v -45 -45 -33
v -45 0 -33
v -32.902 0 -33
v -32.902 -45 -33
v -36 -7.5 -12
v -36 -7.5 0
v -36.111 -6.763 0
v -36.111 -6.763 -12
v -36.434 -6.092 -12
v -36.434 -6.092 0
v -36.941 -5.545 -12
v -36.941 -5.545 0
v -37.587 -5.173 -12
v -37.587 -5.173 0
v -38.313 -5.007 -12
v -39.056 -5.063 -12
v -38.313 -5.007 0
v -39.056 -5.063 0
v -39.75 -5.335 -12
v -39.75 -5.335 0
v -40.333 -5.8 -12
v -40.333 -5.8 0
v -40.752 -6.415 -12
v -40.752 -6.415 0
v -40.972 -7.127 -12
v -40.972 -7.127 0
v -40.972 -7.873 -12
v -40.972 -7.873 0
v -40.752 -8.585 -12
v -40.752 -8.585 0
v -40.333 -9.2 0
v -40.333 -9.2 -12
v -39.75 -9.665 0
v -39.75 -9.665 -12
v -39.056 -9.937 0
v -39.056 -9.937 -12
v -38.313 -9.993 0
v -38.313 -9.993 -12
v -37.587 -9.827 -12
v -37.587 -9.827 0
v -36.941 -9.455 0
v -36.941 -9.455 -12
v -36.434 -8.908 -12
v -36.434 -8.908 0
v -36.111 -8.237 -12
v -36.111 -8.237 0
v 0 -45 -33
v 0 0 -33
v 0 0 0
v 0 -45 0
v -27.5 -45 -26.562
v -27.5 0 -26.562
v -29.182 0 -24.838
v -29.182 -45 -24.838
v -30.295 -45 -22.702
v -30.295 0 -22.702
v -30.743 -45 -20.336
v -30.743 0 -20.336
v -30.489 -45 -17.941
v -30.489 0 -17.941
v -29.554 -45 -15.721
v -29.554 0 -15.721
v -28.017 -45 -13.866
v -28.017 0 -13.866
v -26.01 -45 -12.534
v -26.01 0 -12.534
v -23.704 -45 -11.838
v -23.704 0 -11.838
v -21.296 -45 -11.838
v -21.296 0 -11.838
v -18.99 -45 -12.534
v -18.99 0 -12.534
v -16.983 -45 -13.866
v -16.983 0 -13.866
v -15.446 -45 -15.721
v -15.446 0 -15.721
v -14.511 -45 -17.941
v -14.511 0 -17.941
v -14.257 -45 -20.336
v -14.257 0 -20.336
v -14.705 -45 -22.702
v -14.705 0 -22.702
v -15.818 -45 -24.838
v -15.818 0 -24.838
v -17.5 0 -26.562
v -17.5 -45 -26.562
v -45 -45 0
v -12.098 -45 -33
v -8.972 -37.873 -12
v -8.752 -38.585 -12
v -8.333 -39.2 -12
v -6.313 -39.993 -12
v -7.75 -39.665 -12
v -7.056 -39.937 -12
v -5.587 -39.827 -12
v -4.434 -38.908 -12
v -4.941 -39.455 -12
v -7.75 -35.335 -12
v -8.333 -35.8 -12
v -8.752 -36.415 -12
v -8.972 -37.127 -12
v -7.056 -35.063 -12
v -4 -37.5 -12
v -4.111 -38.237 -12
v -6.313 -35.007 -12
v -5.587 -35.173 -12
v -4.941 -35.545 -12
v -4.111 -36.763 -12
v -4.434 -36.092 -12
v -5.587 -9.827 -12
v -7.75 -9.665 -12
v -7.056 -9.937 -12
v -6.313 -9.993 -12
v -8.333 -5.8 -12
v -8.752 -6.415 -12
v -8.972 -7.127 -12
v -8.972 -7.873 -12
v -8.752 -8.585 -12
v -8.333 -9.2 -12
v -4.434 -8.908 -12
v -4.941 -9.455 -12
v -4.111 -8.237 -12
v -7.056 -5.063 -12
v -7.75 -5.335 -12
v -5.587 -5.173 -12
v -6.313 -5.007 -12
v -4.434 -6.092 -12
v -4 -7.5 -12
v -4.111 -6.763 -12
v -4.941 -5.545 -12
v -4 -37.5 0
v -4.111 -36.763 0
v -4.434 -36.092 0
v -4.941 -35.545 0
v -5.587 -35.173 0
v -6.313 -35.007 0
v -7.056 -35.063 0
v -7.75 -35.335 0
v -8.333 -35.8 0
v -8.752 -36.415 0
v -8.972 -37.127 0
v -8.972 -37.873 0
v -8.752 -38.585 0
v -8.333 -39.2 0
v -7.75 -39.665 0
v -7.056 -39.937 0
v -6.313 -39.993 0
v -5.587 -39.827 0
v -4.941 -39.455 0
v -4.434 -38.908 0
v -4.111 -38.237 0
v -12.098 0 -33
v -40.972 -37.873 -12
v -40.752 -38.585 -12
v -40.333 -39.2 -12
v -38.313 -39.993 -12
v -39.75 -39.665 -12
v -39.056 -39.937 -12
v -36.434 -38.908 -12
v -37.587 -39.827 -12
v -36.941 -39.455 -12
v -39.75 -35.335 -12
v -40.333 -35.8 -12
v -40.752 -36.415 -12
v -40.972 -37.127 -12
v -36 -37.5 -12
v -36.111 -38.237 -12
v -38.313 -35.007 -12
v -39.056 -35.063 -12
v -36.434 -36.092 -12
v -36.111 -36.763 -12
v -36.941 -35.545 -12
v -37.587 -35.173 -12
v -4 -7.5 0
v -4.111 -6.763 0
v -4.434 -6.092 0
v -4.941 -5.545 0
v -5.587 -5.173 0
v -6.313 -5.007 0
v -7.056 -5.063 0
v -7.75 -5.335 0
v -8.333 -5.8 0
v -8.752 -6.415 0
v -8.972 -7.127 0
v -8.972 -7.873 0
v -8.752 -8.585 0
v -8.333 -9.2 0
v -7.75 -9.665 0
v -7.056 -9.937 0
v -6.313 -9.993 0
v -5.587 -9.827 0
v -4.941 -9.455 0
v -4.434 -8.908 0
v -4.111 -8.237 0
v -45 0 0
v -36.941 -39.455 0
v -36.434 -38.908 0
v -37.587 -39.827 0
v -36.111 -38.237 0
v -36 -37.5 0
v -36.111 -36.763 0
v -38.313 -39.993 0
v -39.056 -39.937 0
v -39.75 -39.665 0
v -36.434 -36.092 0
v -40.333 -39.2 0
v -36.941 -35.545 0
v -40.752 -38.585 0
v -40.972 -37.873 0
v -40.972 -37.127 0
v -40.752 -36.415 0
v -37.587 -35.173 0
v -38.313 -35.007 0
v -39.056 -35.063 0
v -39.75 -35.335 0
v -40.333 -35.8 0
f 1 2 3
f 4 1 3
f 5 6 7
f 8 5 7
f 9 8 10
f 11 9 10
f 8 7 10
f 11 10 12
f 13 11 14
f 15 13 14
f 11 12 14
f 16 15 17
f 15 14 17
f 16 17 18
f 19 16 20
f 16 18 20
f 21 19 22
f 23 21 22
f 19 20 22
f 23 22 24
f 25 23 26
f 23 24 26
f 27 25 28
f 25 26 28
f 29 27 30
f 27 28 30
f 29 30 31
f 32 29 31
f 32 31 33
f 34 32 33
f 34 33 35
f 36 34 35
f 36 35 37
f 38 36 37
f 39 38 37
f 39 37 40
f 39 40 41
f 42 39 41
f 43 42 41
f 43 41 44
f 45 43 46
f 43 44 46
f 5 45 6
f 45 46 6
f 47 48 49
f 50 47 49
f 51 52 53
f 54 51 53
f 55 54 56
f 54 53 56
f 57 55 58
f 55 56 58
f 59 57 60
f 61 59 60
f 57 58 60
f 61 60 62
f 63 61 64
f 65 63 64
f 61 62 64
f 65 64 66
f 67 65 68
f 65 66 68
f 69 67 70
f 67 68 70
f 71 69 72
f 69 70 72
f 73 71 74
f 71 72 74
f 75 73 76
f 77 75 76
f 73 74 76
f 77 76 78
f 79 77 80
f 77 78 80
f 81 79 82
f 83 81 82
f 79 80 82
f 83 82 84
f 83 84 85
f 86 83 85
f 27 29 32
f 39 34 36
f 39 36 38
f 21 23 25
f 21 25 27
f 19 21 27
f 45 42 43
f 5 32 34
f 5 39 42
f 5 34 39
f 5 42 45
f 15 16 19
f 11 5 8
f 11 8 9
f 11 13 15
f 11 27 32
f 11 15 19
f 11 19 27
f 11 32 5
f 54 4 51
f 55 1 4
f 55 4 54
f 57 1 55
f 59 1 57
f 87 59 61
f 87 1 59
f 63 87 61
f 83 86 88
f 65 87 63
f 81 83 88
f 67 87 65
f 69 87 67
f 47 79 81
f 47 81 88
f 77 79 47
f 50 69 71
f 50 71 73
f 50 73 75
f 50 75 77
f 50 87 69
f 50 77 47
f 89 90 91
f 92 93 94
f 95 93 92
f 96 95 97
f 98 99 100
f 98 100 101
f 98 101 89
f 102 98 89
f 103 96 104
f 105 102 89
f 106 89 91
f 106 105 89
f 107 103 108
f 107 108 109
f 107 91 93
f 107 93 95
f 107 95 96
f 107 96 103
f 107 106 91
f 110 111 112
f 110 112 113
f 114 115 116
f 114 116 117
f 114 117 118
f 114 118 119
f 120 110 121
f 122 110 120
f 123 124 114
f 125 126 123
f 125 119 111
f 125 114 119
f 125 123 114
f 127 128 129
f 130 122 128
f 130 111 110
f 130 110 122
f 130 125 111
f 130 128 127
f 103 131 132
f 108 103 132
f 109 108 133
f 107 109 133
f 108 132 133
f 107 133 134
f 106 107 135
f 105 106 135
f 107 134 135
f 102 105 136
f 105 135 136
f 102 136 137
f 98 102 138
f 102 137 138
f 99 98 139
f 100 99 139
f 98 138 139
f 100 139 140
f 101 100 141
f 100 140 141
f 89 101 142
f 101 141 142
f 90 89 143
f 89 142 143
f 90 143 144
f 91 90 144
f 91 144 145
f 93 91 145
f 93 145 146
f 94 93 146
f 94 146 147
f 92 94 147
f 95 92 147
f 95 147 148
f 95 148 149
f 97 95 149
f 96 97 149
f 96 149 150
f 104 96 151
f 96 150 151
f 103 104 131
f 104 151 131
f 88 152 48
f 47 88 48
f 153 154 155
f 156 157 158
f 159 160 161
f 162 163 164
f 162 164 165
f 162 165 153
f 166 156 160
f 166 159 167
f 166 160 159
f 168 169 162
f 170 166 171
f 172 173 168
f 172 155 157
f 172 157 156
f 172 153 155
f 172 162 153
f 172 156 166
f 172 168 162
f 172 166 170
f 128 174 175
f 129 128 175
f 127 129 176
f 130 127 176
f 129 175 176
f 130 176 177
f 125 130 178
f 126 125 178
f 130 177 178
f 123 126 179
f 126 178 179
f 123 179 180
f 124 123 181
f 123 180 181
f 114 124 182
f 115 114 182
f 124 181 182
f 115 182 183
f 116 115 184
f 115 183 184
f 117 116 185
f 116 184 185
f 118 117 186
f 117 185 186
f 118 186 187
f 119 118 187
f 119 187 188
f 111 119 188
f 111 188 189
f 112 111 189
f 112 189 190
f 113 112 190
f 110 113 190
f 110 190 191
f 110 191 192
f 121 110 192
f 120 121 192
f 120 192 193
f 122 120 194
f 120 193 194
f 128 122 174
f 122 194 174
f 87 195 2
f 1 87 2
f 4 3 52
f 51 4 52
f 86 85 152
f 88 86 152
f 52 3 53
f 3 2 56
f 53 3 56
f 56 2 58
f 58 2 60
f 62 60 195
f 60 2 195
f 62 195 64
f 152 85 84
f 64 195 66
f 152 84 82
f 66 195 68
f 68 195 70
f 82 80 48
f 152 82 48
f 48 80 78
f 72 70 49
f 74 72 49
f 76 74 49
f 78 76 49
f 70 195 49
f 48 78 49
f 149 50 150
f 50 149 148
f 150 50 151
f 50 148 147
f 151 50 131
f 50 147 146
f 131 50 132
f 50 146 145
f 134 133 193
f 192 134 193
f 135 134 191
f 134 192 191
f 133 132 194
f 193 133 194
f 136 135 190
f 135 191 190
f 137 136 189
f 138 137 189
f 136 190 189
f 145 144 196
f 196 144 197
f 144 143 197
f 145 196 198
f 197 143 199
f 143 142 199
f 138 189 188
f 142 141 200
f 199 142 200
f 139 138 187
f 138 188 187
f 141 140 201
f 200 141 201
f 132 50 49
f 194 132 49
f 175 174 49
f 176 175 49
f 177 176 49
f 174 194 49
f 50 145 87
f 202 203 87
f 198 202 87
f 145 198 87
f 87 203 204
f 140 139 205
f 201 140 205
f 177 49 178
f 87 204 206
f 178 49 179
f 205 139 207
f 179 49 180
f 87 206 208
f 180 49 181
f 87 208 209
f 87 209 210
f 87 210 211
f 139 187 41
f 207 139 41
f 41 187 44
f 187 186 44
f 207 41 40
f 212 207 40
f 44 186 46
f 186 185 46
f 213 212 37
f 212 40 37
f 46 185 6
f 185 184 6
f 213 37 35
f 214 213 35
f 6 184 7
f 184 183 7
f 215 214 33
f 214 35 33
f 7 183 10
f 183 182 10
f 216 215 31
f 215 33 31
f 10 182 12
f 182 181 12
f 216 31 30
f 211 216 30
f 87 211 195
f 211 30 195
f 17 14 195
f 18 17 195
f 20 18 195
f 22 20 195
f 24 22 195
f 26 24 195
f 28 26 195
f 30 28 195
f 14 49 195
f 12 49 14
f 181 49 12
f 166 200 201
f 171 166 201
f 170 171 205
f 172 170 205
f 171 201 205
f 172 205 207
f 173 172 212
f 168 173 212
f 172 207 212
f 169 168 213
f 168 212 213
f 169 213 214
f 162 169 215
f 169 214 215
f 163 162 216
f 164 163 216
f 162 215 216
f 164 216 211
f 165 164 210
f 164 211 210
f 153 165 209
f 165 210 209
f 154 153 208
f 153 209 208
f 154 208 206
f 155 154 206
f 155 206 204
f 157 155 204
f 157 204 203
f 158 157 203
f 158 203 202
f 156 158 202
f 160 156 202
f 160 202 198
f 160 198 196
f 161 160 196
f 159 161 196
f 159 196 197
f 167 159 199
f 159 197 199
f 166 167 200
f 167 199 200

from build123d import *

# Parameters (mm, degrees)
F1_DEPTH = 45
F2_R     = 2.5
F3_DEPTH = 12


with BuildPart() as f1:
    # F0 (on Front) → F1 (new body)
    with BuildSketch(Plane.XZ):
        with BuildLine():
            Line((0, -33), (0, 0))
            Line((0, 0), (-45, 0))
            Line((-45, 0), (-45, -33))
            Line((-45, -33), (-32.901954, -33))
            Line((-32.901954, -33), (-27.5, -26.562202))
            ThreePointArc((-27.5, -26.562202), (-22.5, -11.75), (-17.5, -26.562202))
            Line((-17.5, -26.562202), (-12.098046, -33))
            Line((-12.098046, -33), (0, -33))
        make_face()
    extrude(amount=F1_DEPTH)

    # F2 (on face) → F3 (cut)
    with BuildSketch(Plane.XY):
        with Locations((-38.5, -37.5)):
            Circle(F2_R)
        with Locations((-6.5, -37.5)):
            Circle(F2_R)
        with Locations((-6.5, -7.5)):
            Circle(F2_R)
        with Locations((-38.5, -7.5)):
            Circle(F2_R)
    extrude(amount=-F3_DEPTH, mode=Mode.SUBTRACT)


solid = f1.part
